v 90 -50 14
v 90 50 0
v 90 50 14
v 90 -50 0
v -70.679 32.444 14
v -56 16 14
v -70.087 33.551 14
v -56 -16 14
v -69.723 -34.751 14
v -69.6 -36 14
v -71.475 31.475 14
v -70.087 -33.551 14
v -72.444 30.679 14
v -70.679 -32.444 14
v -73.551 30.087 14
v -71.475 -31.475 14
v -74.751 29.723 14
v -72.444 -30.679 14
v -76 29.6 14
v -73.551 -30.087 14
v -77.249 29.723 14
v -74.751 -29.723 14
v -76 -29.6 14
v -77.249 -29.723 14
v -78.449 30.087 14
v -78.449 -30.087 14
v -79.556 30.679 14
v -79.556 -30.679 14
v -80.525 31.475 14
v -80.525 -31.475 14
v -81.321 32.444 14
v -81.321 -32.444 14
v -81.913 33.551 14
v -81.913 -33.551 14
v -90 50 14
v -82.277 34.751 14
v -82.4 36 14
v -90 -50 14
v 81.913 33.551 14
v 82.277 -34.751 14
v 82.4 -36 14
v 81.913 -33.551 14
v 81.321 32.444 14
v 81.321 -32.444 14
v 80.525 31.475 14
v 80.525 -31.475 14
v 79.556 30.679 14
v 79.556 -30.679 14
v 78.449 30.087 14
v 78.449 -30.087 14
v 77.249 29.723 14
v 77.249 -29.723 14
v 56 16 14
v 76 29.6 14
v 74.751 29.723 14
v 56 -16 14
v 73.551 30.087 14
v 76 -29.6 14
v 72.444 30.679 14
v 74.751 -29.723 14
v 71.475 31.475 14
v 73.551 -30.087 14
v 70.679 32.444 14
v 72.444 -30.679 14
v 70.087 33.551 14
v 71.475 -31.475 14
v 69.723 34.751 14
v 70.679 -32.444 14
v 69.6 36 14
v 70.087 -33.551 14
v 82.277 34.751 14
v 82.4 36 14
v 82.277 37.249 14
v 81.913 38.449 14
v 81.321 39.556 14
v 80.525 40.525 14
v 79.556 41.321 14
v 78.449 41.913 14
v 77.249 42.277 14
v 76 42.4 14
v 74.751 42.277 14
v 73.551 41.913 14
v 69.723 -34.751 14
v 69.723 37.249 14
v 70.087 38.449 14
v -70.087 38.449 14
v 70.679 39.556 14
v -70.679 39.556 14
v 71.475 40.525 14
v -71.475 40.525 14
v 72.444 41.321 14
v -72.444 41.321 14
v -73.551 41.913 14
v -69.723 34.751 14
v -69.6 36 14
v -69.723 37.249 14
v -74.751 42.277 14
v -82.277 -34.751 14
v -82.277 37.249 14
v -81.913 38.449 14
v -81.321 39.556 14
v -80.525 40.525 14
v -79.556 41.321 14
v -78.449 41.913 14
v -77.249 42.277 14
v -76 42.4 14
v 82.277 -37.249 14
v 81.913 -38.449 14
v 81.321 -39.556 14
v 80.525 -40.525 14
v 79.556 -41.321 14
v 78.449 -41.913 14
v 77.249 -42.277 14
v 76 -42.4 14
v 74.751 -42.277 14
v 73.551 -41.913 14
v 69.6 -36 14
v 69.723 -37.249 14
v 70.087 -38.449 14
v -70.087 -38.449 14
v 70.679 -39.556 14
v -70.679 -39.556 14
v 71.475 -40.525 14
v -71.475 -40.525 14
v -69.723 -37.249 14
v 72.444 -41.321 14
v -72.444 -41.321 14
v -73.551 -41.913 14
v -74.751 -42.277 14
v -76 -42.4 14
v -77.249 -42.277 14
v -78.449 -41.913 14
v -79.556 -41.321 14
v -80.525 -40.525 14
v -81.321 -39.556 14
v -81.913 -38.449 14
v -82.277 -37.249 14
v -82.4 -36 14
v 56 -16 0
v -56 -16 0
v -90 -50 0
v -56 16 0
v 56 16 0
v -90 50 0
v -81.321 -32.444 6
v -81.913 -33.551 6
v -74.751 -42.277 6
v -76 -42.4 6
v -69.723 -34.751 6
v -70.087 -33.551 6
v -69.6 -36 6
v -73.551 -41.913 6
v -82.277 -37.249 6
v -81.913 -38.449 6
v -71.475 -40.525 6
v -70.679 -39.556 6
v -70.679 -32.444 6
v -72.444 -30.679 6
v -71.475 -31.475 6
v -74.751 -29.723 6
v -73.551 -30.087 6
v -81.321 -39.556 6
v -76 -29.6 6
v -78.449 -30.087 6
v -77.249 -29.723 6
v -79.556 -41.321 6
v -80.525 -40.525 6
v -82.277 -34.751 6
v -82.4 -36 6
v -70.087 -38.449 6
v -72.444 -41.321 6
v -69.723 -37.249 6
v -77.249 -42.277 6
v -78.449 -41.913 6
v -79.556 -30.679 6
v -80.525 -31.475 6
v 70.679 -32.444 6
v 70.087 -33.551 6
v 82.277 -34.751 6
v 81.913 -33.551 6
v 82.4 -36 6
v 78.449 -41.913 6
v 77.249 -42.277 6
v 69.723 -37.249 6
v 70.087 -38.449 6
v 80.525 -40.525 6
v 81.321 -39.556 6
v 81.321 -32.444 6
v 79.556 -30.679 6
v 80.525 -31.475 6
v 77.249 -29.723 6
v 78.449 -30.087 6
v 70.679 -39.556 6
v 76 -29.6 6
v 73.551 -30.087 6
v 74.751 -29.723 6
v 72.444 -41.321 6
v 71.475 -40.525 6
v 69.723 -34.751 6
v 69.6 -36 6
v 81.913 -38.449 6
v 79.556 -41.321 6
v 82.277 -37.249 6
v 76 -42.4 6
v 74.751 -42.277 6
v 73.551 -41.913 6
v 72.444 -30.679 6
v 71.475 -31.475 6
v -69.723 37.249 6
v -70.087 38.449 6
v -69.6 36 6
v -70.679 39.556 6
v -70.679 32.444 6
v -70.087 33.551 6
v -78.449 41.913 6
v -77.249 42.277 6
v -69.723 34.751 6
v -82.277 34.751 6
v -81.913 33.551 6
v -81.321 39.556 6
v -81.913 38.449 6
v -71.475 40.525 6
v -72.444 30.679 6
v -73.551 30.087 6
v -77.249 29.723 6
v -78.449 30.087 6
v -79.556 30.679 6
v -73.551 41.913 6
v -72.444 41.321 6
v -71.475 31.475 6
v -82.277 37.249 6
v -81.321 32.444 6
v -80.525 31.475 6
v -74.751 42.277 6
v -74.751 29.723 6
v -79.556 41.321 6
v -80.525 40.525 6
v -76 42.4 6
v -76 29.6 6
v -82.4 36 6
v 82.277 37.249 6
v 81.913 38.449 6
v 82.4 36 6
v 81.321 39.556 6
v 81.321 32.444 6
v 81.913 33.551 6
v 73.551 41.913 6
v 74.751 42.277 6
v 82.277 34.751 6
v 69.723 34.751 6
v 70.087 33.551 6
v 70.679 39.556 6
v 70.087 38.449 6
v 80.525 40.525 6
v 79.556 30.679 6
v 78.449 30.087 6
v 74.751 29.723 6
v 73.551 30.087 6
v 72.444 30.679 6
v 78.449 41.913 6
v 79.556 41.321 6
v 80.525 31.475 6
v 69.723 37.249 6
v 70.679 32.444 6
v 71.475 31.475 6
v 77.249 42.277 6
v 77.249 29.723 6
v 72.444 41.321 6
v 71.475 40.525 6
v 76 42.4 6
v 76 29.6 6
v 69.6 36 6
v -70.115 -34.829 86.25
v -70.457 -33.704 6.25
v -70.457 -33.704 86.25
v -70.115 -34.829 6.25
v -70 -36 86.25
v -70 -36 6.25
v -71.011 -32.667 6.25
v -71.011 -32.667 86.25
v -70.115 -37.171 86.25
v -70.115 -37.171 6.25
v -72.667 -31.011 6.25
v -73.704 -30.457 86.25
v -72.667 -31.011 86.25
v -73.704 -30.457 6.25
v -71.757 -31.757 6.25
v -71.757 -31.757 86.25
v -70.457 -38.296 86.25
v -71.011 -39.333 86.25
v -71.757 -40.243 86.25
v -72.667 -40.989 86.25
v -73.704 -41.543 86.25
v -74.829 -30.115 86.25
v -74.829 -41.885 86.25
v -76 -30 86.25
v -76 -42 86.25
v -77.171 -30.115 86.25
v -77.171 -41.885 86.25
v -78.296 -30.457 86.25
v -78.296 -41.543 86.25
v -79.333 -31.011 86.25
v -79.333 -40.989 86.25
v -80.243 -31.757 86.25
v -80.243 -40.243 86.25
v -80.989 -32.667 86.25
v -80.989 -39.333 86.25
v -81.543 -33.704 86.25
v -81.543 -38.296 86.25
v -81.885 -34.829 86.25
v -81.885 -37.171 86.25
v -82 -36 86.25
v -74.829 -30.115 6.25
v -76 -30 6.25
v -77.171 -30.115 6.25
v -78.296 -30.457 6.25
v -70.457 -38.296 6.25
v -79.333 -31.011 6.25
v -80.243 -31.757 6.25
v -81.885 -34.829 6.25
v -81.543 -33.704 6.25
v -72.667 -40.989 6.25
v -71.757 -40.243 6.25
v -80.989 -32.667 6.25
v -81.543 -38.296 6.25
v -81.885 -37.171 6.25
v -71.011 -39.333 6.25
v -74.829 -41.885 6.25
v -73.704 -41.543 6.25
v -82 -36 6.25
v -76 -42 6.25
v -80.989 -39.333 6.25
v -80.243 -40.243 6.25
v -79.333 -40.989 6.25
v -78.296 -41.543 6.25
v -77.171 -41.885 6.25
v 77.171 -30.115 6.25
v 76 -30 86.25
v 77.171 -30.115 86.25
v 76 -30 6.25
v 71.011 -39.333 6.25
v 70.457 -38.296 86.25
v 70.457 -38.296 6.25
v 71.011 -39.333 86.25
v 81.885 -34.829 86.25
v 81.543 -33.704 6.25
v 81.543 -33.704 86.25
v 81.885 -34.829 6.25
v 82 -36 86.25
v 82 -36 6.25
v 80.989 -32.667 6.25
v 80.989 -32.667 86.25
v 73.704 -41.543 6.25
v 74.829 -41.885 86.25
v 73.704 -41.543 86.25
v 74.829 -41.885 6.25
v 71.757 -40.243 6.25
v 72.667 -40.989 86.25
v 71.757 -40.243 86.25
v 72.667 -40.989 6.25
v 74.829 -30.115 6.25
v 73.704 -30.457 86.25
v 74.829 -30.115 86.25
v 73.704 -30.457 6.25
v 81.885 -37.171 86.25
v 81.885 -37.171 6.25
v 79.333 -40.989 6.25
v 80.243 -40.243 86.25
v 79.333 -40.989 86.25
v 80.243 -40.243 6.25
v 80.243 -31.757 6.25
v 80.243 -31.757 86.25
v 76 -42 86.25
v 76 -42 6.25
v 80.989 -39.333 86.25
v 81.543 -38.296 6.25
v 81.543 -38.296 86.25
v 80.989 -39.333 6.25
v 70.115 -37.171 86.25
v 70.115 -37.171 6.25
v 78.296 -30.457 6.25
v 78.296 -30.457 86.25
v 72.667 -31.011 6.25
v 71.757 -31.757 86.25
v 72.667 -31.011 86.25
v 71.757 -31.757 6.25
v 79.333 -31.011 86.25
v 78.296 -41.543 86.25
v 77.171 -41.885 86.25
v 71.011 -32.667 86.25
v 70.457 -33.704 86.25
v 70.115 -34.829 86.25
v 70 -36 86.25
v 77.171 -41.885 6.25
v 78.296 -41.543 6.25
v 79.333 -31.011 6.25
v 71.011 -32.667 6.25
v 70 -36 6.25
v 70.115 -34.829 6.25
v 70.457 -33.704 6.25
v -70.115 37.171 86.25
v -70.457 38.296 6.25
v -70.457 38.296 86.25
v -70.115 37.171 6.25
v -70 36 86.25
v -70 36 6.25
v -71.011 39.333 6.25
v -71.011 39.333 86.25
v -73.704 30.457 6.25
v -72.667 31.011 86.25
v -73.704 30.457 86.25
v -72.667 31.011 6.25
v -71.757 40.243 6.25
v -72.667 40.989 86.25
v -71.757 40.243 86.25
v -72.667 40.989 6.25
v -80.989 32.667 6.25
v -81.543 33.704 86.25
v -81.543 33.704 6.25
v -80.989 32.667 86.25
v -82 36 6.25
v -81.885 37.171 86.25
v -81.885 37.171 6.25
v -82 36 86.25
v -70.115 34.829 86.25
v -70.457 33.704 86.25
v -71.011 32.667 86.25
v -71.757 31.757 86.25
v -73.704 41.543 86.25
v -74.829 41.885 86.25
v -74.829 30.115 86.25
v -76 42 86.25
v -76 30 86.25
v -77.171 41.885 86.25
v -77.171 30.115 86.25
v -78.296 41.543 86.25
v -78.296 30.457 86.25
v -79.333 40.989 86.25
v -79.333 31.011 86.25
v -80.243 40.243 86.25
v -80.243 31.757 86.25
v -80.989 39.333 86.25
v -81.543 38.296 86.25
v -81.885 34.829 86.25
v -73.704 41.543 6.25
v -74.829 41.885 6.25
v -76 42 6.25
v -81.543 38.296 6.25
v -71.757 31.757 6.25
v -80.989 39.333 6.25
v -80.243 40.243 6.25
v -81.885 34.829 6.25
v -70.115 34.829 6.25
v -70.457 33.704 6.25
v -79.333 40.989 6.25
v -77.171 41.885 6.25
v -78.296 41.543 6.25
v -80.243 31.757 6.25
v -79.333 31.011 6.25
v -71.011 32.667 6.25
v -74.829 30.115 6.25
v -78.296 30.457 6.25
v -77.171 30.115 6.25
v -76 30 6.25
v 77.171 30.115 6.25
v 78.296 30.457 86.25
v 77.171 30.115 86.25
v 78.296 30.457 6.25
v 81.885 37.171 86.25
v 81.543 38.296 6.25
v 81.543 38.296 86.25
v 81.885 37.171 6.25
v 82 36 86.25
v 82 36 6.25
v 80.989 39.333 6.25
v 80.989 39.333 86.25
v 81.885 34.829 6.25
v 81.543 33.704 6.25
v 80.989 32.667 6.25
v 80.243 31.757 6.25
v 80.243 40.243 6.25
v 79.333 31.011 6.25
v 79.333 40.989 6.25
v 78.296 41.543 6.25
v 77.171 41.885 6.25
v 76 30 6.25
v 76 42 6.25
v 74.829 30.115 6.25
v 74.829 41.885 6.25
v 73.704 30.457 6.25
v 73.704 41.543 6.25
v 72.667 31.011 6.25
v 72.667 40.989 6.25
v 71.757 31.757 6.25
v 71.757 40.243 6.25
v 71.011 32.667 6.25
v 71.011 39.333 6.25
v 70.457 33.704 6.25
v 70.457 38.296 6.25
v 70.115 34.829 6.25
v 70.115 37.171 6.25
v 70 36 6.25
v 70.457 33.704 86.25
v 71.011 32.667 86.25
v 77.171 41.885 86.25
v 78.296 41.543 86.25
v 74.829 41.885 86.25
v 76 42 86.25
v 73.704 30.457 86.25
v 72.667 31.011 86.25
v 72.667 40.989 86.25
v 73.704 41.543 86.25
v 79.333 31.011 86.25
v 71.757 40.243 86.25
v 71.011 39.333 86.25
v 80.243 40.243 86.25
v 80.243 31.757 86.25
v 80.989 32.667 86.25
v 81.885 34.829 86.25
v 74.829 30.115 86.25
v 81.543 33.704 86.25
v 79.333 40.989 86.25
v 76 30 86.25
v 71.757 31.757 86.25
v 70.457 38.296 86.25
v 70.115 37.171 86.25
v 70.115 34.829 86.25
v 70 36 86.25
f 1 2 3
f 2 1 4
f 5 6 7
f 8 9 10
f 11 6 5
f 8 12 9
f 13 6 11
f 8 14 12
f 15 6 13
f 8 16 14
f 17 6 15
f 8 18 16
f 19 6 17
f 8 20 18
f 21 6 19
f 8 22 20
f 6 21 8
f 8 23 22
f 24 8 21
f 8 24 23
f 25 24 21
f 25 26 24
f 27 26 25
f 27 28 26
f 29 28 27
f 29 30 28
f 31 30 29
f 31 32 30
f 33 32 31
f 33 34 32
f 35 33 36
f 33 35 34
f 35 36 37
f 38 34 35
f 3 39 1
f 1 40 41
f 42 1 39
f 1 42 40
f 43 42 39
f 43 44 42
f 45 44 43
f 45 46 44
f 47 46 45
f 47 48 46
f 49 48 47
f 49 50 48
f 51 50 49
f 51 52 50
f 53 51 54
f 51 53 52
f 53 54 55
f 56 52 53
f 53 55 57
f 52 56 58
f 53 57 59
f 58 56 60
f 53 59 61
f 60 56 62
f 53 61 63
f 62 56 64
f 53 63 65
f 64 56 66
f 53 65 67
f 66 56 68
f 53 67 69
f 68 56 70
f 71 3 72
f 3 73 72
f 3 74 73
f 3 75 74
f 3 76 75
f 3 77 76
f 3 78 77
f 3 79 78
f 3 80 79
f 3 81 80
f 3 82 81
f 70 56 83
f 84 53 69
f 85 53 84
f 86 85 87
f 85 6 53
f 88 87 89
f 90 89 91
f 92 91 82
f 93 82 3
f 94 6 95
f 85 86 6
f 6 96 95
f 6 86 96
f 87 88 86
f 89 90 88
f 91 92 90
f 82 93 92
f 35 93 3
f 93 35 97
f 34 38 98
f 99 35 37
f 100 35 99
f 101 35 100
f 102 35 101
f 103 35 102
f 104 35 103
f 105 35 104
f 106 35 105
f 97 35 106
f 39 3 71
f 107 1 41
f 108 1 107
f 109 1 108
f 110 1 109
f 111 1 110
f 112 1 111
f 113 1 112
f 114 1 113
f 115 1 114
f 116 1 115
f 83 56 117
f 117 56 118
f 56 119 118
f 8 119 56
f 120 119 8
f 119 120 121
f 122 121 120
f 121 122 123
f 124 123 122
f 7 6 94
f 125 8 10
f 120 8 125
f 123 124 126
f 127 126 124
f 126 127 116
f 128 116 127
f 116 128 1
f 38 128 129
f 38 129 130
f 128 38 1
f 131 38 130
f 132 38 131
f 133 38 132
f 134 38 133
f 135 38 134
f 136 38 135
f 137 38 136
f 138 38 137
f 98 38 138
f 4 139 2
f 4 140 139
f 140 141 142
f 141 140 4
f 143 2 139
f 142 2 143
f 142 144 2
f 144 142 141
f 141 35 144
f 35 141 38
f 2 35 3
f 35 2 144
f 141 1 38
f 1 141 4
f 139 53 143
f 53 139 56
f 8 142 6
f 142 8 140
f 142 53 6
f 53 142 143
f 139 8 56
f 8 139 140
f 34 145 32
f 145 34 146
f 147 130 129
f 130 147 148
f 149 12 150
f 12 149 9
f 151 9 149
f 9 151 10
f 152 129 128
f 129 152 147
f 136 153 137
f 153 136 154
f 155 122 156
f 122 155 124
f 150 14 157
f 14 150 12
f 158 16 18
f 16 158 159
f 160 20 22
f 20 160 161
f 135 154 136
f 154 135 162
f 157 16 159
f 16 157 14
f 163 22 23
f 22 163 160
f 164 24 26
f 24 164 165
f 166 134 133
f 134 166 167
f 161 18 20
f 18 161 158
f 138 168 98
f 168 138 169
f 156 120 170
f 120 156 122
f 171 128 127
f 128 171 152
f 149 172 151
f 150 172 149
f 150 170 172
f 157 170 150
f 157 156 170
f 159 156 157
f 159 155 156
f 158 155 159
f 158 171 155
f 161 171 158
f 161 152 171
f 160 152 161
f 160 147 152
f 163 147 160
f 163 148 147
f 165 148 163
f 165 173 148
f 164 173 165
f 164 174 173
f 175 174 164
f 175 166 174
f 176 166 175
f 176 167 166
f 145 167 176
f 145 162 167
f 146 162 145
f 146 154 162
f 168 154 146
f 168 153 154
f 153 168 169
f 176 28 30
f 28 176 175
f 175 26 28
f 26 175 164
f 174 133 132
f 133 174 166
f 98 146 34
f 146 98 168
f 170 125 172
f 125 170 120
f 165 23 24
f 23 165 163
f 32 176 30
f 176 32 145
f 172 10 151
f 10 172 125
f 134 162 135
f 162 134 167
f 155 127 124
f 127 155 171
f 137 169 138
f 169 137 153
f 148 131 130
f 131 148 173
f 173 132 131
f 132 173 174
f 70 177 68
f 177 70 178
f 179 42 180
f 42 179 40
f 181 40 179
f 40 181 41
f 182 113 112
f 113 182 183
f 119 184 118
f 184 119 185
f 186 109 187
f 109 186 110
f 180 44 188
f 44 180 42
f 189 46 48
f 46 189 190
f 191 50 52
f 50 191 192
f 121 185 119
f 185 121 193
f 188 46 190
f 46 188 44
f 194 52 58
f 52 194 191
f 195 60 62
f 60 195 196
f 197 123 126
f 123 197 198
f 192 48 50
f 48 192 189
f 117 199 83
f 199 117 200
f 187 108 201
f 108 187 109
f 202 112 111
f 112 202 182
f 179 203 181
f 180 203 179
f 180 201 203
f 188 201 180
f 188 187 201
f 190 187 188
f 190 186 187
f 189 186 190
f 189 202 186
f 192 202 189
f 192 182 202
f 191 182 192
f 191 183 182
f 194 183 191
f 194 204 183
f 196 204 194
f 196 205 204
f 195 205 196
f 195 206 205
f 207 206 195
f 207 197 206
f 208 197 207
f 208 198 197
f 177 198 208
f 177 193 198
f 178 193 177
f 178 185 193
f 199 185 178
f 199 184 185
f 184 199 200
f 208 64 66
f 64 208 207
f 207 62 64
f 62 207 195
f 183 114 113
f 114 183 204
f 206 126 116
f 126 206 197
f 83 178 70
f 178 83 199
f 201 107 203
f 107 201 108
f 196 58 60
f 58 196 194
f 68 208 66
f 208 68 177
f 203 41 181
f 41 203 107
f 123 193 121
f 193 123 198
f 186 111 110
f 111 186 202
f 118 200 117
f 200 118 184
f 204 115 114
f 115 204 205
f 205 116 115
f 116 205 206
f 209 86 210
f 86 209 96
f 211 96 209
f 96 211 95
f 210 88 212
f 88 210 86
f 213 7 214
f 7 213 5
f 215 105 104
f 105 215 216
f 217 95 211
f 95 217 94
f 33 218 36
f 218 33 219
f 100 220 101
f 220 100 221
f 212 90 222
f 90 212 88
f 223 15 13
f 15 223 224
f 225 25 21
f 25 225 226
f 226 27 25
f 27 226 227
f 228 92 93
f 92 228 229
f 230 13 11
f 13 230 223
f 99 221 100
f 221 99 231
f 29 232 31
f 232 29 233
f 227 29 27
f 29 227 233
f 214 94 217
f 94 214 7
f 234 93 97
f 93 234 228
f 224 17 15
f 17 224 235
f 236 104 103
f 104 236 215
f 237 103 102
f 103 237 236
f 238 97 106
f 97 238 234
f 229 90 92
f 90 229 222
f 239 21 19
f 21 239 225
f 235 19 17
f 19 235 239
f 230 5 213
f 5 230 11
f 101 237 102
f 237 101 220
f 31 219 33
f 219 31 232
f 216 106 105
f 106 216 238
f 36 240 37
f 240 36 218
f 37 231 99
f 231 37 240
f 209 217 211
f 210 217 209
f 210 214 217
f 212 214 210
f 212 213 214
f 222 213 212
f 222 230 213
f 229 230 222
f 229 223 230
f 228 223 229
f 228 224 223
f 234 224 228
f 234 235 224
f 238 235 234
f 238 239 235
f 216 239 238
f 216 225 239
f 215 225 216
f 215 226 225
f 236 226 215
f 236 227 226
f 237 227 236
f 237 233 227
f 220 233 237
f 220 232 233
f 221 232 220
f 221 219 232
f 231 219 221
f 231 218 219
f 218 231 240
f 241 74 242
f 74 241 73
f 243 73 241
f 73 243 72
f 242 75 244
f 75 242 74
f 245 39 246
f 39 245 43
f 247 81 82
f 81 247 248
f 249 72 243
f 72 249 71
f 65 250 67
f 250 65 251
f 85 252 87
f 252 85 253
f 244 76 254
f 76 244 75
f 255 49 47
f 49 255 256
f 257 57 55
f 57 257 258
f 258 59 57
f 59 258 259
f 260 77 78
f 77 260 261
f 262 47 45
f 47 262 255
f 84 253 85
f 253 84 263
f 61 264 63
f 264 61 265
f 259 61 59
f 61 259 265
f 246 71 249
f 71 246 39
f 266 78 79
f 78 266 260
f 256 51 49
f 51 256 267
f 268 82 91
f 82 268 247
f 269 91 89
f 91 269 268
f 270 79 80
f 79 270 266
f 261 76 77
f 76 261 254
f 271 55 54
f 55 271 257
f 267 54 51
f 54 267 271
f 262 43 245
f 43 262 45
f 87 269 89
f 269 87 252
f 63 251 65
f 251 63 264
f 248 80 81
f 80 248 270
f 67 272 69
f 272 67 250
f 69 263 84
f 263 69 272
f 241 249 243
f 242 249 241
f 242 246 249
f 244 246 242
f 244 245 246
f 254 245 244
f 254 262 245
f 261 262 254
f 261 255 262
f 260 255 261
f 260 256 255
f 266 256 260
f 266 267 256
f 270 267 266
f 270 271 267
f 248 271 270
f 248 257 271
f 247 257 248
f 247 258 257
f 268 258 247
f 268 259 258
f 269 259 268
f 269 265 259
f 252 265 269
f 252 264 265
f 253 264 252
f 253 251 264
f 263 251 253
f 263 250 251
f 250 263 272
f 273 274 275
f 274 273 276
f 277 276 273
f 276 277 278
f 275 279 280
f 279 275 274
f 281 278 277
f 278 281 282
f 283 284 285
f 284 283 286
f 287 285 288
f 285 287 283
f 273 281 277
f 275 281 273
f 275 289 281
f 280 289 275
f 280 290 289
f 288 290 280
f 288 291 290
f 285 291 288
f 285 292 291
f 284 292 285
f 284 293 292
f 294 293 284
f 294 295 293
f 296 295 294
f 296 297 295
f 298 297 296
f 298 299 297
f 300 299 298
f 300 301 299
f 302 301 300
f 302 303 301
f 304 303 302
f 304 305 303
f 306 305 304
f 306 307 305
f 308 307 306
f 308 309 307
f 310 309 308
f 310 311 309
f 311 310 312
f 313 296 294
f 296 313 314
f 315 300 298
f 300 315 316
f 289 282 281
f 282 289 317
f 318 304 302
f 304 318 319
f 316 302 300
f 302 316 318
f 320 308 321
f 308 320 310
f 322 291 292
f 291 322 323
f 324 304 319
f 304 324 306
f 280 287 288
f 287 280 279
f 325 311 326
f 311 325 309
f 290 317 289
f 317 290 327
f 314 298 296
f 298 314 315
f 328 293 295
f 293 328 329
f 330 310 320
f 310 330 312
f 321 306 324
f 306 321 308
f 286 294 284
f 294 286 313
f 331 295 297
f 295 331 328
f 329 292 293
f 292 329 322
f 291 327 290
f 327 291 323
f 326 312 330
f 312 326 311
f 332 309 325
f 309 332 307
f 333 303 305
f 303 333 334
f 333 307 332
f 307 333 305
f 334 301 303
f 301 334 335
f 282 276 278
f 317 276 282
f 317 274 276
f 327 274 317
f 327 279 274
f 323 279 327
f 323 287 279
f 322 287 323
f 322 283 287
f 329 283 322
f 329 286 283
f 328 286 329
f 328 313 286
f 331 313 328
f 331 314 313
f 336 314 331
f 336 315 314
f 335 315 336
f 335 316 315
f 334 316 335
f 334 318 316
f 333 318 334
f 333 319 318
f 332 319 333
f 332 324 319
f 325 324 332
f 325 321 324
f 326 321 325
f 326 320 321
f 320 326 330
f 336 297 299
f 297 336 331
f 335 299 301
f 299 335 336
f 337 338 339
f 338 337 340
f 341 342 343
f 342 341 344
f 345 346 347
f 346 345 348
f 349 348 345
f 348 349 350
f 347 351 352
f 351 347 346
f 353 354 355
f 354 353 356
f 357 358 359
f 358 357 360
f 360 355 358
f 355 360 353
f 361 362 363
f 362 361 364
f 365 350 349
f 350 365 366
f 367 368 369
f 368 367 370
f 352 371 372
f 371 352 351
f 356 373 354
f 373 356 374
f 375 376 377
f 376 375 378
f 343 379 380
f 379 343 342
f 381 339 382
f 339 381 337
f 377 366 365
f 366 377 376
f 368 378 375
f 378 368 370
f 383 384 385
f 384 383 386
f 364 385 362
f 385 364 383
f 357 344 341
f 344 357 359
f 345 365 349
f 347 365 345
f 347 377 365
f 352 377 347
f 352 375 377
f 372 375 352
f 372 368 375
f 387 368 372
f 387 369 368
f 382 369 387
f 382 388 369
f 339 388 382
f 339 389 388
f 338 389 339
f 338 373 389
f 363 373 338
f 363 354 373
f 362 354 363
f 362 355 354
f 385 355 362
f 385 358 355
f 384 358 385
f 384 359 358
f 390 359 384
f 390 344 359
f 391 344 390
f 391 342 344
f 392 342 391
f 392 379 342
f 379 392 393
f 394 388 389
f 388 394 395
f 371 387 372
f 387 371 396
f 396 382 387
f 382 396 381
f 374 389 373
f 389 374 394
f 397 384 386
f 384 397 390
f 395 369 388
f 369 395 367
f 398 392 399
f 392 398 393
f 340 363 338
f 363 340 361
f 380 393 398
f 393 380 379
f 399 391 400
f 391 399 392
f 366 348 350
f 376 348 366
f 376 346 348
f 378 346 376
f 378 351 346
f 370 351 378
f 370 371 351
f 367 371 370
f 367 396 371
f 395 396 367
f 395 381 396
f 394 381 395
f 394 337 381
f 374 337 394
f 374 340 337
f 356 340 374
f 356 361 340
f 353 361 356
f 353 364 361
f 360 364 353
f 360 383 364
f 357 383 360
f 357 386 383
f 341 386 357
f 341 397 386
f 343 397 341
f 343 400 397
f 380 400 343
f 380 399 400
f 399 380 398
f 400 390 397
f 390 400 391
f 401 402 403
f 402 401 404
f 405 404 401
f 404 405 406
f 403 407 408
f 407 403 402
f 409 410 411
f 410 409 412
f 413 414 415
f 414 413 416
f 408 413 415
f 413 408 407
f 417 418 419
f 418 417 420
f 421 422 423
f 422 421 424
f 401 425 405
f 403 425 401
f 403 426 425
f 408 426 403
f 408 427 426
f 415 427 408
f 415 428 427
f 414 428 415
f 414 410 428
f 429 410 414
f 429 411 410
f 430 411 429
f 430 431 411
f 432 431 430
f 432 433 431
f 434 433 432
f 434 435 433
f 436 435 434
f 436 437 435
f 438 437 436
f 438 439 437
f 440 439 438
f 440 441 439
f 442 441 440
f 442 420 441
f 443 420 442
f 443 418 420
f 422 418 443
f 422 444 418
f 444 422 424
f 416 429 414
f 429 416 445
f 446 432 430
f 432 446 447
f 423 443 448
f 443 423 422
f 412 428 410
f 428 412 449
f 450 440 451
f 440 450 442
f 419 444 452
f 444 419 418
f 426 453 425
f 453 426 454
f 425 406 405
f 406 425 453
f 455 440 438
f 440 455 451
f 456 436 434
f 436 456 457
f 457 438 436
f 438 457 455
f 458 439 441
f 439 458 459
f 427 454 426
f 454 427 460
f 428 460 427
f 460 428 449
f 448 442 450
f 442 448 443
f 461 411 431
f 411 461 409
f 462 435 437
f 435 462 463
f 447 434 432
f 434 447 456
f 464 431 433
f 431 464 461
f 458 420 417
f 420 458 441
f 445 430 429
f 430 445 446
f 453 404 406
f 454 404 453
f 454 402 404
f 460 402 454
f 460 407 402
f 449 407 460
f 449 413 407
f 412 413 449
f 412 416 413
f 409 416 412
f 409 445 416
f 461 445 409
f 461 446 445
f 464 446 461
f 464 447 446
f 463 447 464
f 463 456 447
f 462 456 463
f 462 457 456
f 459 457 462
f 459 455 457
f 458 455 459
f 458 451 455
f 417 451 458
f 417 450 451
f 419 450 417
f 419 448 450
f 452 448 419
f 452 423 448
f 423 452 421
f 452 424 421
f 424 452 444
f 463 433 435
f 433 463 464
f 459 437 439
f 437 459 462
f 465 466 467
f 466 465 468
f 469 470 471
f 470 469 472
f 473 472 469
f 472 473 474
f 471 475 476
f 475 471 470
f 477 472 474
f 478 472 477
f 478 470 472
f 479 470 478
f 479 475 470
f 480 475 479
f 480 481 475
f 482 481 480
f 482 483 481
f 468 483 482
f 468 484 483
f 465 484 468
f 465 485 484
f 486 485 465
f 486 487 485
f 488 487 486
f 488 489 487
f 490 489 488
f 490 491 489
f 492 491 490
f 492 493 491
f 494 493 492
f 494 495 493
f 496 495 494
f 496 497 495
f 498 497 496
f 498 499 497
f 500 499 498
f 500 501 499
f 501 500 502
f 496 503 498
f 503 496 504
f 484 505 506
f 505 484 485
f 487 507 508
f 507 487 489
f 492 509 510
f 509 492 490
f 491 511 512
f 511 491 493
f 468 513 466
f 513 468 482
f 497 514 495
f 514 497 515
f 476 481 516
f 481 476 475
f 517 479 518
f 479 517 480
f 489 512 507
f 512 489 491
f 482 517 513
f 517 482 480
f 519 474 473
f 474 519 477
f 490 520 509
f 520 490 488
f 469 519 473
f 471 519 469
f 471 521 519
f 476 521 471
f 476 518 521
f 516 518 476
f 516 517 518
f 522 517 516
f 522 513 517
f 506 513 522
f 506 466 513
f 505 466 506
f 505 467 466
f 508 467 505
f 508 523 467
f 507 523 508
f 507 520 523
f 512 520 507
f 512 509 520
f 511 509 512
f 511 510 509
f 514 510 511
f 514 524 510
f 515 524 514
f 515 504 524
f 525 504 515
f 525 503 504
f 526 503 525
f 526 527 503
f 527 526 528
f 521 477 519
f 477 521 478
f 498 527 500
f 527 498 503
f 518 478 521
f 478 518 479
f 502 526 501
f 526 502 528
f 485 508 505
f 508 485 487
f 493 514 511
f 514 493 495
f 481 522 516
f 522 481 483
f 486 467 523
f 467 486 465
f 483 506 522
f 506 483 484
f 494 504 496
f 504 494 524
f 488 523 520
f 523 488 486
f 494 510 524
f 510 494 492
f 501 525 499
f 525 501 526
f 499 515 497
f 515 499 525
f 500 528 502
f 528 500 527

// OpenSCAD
$fn = 32;

// ------------------------------------------------------------------------
// Frame with four posts: 180 x 100 mm frame, four d12 posts
// Every part is its own module, assembly() places them once.
// ------------------------------------------------------------------------

// --- part 1 ---
module base_frame() {
  difference() {
    translate([-90, -50, 0]) cube([180, 100, 14]);
    translate([-56, -16, -1]) cube([112, 32, 16]);
    translate([-76, -36, 6]) cylinder(h = 9, d = 12.8);
    translate([76, -36, 6]) cylinder(h = 9, d = 12.8);
    translate([-76, 36, 6]) cylinder(h = 9, d = 12.8);
    translate([76, 36, 6]) cylinder(h = 9, d = 12.8);
  }
}

// --- part 2 ---
module post1() {
  cylinder(h = 80, d = 12);
}

// --- part 3 ---
module post2() {
  cylinder(h = 80, d = 12);
}

// --- part 4 ---
module post3() {
  cylinder(h = 80, d = 12);
}

// --- part 5 ---
module post4() {
  cylinder(h = 80, d = 12);
}

// --- assembly ---
module assembly() {
  translate([0, 0, 0]) rotate([0, 0, 0]) base_frame();
  translate([-76, -36, 6.25]) rotate([0, 0, 0]) post1();
  translate([76, -36, 6.25]) rotate([0, 0, 0]) post2();
  translate([-76, 36, 6.25]) rotate([0, 0, 0]) post3();
  translate([76, 36, 6.25]) rotate([0, 0, 0]) post4();
}

assembly();
